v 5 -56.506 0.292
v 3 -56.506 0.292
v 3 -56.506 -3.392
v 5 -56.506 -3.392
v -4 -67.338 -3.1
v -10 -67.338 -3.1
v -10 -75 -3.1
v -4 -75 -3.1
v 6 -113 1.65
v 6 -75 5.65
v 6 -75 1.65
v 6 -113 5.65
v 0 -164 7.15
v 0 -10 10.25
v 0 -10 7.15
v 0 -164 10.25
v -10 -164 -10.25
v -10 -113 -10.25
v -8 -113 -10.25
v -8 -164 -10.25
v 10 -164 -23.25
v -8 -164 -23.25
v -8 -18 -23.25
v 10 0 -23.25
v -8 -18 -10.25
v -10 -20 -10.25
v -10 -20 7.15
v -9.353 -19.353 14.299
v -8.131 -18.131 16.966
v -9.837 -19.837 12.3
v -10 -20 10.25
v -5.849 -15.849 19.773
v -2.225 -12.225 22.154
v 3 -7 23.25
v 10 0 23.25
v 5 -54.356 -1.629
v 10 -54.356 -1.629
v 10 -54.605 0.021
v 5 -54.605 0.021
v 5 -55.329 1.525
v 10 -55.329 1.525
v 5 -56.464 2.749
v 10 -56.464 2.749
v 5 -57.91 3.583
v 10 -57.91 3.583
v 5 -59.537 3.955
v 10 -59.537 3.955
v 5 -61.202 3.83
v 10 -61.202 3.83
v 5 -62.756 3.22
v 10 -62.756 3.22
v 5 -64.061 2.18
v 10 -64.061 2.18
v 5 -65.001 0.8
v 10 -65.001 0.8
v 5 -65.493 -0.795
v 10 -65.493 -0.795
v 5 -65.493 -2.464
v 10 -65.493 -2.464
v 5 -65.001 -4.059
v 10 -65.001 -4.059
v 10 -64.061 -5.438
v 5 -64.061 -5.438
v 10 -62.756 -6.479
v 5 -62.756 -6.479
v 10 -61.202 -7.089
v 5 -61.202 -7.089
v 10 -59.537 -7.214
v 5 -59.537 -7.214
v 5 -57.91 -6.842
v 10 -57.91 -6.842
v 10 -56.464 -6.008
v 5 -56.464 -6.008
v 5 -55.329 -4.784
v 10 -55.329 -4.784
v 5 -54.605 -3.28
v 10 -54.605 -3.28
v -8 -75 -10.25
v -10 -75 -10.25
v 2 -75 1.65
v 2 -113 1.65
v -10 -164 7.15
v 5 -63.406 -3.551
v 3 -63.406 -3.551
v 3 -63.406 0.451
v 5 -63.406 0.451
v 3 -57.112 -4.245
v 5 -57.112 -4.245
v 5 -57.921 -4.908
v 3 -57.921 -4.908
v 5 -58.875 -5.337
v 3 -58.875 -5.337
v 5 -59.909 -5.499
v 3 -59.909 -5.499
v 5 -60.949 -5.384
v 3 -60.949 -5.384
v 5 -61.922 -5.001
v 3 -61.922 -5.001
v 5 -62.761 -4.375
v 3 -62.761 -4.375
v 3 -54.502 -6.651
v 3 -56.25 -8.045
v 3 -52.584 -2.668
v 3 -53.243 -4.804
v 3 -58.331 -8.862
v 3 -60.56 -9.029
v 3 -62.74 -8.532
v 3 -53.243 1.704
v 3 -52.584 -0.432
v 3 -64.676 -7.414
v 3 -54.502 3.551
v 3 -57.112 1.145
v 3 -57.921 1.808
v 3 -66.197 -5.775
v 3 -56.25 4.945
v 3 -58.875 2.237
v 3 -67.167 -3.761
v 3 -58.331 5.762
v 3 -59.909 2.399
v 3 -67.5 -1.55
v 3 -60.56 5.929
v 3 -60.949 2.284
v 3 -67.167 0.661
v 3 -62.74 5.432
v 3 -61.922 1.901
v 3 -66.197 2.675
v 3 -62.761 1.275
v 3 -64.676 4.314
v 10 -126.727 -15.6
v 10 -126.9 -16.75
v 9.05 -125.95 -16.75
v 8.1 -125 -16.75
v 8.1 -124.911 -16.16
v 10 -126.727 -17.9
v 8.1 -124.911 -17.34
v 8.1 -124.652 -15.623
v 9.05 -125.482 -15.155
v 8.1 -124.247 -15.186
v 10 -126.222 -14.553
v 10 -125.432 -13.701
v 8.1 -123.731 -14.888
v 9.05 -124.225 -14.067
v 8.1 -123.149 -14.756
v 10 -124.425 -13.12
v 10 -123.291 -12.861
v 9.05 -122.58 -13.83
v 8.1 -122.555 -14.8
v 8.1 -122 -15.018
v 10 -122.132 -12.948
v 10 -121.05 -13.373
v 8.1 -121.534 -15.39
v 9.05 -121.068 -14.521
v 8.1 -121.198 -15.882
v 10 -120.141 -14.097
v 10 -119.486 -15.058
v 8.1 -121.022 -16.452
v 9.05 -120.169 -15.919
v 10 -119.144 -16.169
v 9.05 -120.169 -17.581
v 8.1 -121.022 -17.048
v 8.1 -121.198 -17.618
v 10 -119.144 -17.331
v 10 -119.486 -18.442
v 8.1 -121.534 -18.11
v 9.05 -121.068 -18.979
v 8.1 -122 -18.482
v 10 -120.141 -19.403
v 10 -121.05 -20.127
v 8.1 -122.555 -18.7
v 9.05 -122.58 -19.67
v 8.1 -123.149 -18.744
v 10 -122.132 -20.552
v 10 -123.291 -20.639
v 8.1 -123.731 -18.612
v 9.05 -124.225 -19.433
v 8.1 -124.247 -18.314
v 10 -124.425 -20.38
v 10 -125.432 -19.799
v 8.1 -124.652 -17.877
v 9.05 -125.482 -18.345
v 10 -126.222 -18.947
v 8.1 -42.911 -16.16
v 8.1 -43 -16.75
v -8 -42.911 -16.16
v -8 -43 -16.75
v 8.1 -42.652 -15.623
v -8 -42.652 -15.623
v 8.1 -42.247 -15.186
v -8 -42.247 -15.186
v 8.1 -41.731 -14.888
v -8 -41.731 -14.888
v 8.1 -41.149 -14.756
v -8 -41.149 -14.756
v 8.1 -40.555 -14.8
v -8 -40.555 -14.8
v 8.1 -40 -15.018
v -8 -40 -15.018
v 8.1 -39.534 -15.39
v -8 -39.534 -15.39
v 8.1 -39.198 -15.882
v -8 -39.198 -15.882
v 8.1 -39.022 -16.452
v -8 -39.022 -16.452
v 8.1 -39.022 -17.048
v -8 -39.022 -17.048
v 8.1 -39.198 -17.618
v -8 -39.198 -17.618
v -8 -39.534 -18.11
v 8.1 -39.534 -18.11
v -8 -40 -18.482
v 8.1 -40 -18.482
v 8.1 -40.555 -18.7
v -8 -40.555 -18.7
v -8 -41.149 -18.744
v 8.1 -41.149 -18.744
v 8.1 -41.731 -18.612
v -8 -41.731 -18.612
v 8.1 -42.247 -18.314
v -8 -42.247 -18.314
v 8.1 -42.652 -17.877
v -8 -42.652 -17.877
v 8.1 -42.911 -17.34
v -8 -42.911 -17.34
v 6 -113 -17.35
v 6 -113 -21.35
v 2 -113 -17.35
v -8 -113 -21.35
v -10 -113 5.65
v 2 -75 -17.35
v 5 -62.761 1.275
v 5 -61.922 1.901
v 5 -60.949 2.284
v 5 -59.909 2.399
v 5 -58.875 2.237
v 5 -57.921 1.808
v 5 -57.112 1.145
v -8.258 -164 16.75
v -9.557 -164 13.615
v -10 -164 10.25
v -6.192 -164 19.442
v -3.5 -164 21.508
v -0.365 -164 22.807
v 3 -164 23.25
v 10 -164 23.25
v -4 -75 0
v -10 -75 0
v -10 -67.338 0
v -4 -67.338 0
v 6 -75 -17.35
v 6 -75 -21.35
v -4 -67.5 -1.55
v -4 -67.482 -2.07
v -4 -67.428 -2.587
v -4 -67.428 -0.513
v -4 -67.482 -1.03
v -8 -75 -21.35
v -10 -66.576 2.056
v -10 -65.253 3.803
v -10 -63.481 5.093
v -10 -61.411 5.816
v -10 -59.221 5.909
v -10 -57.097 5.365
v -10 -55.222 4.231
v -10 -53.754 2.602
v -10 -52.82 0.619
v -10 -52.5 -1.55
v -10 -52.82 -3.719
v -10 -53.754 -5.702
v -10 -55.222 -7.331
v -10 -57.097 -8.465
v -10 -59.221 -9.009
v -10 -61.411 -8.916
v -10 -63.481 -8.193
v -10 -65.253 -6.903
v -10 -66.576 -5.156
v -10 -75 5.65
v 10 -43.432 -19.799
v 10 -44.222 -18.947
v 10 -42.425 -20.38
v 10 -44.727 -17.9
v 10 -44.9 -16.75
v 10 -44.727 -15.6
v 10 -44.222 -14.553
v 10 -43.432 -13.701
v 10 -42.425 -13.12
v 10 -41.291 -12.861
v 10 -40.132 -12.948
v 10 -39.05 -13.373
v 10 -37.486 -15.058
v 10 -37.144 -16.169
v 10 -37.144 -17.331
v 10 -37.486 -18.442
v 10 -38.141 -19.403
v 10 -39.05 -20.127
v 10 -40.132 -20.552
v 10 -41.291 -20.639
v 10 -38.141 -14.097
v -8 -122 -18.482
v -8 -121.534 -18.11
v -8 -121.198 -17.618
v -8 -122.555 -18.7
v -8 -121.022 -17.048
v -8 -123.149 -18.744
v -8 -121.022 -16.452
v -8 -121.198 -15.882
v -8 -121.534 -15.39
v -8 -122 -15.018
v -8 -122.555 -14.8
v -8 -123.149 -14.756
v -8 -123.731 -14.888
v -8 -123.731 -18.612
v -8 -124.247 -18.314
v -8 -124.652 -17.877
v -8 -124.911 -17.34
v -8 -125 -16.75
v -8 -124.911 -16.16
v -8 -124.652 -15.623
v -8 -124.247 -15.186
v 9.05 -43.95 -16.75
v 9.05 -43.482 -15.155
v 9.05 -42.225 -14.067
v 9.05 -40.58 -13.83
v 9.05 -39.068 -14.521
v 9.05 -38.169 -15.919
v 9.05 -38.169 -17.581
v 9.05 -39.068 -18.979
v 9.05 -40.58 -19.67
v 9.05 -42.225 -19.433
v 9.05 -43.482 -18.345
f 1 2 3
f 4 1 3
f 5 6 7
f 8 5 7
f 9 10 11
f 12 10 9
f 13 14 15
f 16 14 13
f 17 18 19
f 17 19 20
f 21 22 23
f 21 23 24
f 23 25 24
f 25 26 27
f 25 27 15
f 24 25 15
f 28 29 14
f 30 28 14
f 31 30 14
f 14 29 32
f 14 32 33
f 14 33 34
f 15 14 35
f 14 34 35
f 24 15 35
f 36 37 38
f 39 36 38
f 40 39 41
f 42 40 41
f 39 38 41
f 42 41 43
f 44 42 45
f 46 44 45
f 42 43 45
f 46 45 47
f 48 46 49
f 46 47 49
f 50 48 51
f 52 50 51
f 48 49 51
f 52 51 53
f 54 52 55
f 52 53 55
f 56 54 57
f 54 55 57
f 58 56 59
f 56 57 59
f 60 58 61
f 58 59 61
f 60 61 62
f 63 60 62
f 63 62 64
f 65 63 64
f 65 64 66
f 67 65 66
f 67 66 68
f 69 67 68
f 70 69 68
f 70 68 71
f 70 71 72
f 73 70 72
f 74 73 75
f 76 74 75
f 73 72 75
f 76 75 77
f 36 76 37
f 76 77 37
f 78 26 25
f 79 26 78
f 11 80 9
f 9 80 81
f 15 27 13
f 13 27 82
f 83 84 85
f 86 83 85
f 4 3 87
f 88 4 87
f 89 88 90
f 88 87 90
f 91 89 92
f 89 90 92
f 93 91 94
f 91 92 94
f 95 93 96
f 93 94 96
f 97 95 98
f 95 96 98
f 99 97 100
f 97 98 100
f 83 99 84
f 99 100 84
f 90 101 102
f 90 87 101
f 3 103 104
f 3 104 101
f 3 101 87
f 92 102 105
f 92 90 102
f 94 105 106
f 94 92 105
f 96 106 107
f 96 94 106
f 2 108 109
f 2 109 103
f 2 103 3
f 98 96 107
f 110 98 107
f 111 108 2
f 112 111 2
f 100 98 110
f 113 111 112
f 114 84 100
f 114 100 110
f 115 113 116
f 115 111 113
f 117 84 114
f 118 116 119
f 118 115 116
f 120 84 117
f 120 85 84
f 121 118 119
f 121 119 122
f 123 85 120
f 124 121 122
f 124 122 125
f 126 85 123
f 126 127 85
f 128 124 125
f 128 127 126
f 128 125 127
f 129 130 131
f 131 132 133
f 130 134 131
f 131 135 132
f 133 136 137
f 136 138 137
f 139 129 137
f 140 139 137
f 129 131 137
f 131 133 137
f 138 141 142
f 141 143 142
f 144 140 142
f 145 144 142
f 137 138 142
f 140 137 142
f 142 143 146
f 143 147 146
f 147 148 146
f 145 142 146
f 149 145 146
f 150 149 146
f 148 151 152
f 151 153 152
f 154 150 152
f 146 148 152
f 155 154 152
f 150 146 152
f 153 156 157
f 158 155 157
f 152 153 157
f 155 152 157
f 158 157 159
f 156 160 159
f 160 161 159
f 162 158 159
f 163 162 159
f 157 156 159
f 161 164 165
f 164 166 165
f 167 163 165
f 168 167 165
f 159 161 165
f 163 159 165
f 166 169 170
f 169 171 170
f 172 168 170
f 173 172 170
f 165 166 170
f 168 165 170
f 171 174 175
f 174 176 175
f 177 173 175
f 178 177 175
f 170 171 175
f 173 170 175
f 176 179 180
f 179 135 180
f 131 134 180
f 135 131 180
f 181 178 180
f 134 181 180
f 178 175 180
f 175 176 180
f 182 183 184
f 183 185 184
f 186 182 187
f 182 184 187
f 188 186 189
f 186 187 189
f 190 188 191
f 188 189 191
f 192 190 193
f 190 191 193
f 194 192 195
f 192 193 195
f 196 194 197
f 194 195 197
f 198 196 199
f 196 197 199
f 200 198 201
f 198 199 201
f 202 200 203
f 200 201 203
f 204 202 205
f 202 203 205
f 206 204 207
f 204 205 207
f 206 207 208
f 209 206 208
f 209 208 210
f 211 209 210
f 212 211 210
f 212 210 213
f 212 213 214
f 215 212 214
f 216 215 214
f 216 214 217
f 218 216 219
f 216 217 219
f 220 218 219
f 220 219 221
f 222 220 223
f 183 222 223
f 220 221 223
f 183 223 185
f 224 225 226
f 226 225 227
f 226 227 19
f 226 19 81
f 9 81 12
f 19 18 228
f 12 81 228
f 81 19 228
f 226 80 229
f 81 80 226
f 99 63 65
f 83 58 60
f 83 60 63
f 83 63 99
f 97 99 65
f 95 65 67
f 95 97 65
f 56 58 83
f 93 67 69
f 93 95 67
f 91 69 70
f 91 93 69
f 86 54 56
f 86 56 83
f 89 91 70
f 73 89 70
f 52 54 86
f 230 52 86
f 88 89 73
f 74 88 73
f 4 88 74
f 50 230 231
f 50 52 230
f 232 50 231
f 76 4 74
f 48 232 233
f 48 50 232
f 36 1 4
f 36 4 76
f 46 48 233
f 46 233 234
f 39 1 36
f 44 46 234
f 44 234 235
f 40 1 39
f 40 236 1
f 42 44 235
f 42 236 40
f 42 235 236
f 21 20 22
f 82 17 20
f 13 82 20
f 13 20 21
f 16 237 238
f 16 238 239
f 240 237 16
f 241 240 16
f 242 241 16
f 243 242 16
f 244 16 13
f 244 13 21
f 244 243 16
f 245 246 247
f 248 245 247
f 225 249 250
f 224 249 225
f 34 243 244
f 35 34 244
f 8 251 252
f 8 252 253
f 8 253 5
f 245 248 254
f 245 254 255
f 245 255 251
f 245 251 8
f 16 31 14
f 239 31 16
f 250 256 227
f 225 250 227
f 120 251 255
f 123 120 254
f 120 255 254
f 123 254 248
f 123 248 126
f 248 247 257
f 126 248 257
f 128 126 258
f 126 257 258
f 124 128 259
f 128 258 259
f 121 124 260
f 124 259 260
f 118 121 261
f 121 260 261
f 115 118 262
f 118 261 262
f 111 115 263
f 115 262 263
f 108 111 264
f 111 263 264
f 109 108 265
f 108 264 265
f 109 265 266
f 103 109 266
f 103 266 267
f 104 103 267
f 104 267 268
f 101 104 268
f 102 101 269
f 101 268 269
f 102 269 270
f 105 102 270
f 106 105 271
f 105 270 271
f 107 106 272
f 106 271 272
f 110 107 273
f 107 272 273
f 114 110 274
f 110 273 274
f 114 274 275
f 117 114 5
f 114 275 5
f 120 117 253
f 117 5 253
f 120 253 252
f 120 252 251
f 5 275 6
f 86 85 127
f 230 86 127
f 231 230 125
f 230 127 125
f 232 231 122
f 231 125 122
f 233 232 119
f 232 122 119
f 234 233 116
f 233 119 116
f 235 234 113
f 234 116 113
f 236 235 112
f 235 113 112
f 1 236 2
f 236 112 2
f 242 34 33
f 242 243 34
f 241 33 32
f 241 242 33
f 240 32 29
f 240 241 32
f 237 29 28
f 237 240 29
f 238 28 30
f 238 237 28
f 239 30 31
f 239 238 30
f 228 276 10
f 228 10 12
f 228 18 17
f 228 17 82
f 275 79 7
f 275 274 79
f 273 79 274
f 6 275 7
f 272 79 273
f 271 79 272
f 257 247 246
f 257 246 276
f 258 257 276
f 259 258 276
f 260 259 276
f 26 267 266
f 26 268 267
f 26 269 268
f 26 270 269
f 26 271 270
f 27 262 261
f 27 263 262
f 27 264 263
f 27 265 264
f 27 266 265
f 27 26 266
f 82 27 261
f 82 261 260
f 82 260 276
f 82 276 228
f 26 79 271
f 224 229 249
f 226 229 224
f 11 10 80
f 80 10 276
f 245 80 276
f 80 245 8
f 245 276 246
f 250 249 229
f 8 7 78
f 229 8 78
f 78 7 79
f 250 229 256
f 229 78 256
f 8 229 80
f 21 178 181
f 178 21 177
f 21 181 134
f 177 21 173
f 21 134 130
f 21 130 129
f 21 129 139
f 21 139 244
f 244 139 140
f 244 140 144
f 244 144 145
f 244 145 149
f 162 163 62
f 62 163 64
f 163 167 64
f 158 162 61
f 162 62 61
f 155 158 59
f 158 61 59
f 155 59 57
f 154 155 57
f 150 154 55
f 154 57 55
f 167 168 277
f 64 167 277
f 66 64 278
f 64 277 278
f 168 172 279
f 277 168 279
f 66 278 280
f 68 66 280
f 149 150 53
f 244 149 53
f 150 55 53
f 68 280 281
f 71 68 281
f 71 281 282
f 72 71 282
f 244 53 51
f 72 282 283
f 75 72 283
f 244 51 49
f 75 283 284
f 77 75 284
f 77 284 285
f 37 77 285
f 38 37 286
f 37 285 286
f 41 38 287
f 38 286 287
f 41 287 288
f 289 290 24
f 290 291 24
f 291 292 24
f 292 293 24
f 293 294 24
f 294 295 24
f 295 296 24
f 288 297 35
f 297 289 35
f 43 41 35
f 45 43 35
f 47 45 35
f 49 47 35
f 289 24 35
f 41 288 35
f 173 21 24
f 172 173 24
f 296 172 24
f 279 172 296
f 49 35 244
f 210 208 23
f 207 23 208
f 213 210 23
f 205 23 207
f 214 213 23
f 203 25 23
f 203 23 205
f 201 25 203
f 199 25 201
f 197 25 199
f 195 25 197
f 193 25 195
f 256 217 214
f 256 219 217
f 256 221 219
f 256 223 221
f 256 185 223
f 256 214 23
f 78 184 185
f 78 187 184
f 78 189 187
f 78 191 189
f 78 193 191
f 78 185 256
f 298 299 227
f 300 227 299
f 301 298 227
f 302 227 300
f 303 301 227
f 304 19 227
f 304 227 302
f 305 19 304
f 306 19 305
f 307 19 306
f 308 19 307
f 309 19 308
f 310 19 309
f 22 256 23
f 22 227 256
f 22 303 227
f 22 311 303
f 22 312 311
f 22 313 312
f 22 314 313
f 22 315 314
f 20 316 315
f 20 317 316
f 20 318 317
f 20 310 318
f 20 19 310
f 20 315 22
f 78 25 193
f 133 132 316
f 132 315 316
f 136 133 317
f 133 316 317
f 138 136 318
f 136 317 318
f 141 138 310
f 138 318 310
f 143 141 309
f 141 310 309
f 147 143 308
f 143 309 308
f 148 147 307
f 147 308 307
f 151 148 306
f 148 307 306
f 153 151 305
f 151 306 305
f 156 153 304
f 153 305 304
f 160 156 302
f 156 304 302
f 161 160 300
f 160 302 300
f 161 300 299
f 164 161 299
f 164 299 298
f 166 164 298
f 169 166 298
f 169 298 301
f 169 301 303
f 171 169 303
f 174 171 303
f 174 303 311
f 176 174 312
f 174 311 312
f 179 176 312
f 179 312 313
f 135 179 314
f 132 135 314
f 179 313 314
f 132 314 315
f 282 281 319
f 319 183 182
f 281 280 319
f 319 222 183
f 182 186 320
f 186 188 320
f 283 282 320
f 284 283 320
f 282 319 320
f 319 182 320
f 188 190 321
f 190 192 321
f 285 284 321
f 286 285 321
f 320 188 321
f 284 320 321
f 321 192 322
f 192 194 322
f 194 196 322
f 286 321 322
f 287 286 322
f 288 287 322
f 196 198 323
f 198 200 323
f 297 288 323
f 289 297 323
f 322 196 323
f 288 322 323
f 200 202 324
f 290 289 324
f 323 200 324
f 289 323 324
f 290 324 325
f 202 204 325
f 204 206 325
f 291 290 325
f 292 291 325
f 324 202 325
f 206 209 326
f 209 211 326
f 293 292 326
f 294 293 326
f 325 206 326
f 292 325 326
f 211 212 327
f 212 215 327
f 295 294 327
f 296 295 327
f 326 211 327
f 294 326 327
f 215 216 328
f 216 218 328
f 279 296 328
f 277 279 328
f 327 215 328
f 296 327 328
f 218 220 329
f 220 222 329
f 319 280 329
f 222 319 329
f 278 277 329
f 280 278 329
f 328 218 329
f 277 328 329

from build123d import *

# Parameters (mm, degrees)
F0_W            = 20
F0_H            = 46.5
F1_DEPTH        = 164
F2_W            = 164
F2_H            = 3.1
F3_DEPTH        = 10
F4_W            = 164
F4_H            = 13
F5_DEPTH        = 2
F7_DEPTH        = 46.5
F8_R            = 12.99999
F10_D           = 4
F10_DEPTH       = 20
F10_CSINK_D     = 7.8
F10_CSINK_ANGLE = 90
F10_TIP         = 1.2017212381
F12_DEPTH       = 20
F13_R           = 7.5
F14_DEPTH       = 13
F15_R           = 5.6
F16_DEPTH       = 5
F17_W           = 38
F17_H           = 15.9
F17_H_2         = 11.1
F18_DEPTH       = 12
F20_DEPTH       = 6
F21_W           = 38
F21_H           = 4
F22_DEPTH       = 4
F23_W           = 38
F23_H           = 4
F24_DEPTH       = 4


# Not quite as in the source:
# - a fillet or chamfer is up to 0.001 mm smaller than in the source, because OpenCascade refuses the exact size


with BuildPart() as f1:
    # F0 (on Front) → F1 (new body)
    with BuildSketch(Plane.XZ):
        Rectangle(F0_W, F0_H)
    extrude(amount=F1_DEPTH)

    # F2 (on face) → F3 (cut)
    with BuildSketch(Plane(origin=(-10, 0, 0), x_dir=(0, -1, 0), z_dir=(-1, 0, 0))):
        with Locations((82, 8.7)):
            Rectangle(F2_W, F2_H)
    extrude(amount=-F3_DEPTH, mode=Mode.SUBTRACT)

    # F4 (on face) → F5 (cut)
    with BuildSketch(Plane(origin=(-10, 0, 0), x_dir=(0, -1, 0), z_dir=(-1, 0, 0))):
        with Locations((82, -16.75)):
            Rectangle(F4_W, F4_H)
    extrude(amount=-F5_DEPTH, mode=Mode.SUBTRACT)

    # F6 (on face) → F7 (cut, through all)
    with BuildSketch(Plane.XY.offset(23.25)):
        Polygon((-10, 0), (-10, -20), (10, 0), align=None)
    extrude(amount=-F7_DEPTH, mode=Mode.SUBTRACT)

    # F8 (radius 13 in the source; OpenCascade refuses exactly that, so slightly less here)
    f8_edges = [f1.edges().sort_by_distance(p)[0] for p in [
        (-10, -92, 23.25),
    ]]
    fillet(f8_edges, radius=F8_R)

    # F10
    with Locations(Plane.YZ.offset(10)):
        with Locations((-123, -16.75), (-41, -16.75)):
            CounterSinkHole(F10_D / 2, F10_CSINK_D / 2, depth=F10_DEPTH, counter_sink_angle=F10_CSINK_ANGLE)
            with Locations((0, 0, -(F10_DEPTH + F10_TIP / 2))):  # 118° drill point
                Cone(0, F10_D / 2, F10_TIP, mode=Mode.SUBTRACT)

    # F11 (on face) → F12 (cut, through all)
    with BuildSketch(Plane(origin=(-10, 0, 0), x_dir=(0, -1, 0), z_dir=(-1, 0, 0))):
        with BuildLine():
            Line((63.4057692308, -3.5508088231), (63.4057692308, 0.4508088231))
            ThreePointArc((63.4057692308, 0.4508088231), (59.9090942784, 2.3989538045), (56.5057692308, 0.2919694165))
            Line((56.5057692308, 0.2919694165), (56.5057692308, -3.3919694165))
            ThreePointArc((56.5057692308, -3.3919694165), (59.9090942784, -5.4989538045), (63.4057692308, -3.5508088231))
        make_face()
    extrude(amount=-F12_DEPTH, mode=Mode.SUBTRACT)

    # F13 (on face) → F14 (cut)
    with BuildSketch(Plane(origin=(-10, 0, 0), x_dir=(0, -1, 0), z_dir=(-1, 0, 0))):
        with Locations((60, -1.55)):
            Circle(F13_R)
        with BuildLine():
            Line((63.4057692308, 0.4508088231), (63.4057692308, -3.5508088231))
            ThreePointArc((63.4057692308, -3.5508088231), (59.9090942784, -5.4989538045), (56.5057692308, -3.3919694165))
            Line((56.5057692308, -3.3919694165), (56.5057692308, 0.2919694165))
            ThreePointArc((56.5057692308, 0.2919694165), (59.9090942784, 2.3989538045), (63.4057692308, 0.4508088231))
        make_face(mode=Mode.SUBTRACT)
    extrude(amount=-F14_DEPTH, mode=Mode.SUBTRACT)

    # F15 (on face) → F16 (cut)
    with BuildSketch(Plane.YZ.offset(10)):
        with Locations((-59.9557692308, -1.6294197033)):
            Circle(F15_R)
        with BuildLine():
            ThreePointArc((-56.5057692308, -3.3919694165), (-59.9090942784, -5.4989538045), (-63.4057692308, -3.5508088231))
            Line((-63.4057692308, -3.5508088231), (-63.4057692308, 0.4508088231))
            ThreePointArc((-63.4057692308, 0.4508088231), (-59.9090942784, 2.3989538045), (-56.5057692308, 0.2919694165))
            Line((-56.5057692308, 0.2919694165), (-56.5057692308, -3.3919694165))
        make_face(mode=Mode.SUBTRACT)
    extrude(amount=-F16_DEPTH, mode=Mode.SUBTRACT)

    # F17 (on face) → F18 (cut)
    with BuildSketch(Plane(origin=(-10, 0, 0), x_dir=(0, -1, 0), z_dir=(-1, 0, 0))):
        with Locations((94, -2.3)):
            Rectangle(F17_W, F17_H)
        with Locations((94, -15.8)):
            Rectangle(F17_W, F17_H_2)
    extrude(amount=-F18_DEPTH, mode=Mode.SUBTRACT)

    # F19 (on face) → F20 (cut)
    with BuildSketch(Plane(origin=(-10, 0, 0), x_dir=(0, -1, 0), z_dir=(-1, 0, 0))):
        with BuildLine():
            Line((75, -3.1), (75, 0))
            Line((75, 0), (67.3380855814, 0))
            ThreePointArc((67.3380855814, 0), (67.4594115673, -0.7707830407), (67.5, -1.55))
            ThreePointArc((67.5, -1.55), (67.4594115673, -2.3292169593), (67.3380855814, -3.1))
            Line((67.3380855814, -3.1), (75, -3.1))
        make_face()
    extrude(amount=-F20_DEPTH, mode=Mode.SUBTRACT)

    # F21 (on face) → F22 (cut)
    with BuildSketch(Plane(origin=(2, 0, 0), x_dir=(0, -1, 0), z_dir=(-1, 0, 0))):
        with Locations((94, 3.65)):
            Rectangle(F21_W, F21_H)
    extrude(amount=-F22_DEPTH, mode=Mode.SUBTRACT)

    # F23 (on face) → F24 (cut)
    with BuildSketch(Plane(origin=(2, 0, 0), x_dir=(0, -1, 0), z_dir=(-1, 0, 0))):
        with Locations((94, -19.35)):
            Rectangle(F23_W, F23_H)
    extrude(amount=-F24_DEPTH, mode=Mode.SUBTRACT)


solid = f1.part
